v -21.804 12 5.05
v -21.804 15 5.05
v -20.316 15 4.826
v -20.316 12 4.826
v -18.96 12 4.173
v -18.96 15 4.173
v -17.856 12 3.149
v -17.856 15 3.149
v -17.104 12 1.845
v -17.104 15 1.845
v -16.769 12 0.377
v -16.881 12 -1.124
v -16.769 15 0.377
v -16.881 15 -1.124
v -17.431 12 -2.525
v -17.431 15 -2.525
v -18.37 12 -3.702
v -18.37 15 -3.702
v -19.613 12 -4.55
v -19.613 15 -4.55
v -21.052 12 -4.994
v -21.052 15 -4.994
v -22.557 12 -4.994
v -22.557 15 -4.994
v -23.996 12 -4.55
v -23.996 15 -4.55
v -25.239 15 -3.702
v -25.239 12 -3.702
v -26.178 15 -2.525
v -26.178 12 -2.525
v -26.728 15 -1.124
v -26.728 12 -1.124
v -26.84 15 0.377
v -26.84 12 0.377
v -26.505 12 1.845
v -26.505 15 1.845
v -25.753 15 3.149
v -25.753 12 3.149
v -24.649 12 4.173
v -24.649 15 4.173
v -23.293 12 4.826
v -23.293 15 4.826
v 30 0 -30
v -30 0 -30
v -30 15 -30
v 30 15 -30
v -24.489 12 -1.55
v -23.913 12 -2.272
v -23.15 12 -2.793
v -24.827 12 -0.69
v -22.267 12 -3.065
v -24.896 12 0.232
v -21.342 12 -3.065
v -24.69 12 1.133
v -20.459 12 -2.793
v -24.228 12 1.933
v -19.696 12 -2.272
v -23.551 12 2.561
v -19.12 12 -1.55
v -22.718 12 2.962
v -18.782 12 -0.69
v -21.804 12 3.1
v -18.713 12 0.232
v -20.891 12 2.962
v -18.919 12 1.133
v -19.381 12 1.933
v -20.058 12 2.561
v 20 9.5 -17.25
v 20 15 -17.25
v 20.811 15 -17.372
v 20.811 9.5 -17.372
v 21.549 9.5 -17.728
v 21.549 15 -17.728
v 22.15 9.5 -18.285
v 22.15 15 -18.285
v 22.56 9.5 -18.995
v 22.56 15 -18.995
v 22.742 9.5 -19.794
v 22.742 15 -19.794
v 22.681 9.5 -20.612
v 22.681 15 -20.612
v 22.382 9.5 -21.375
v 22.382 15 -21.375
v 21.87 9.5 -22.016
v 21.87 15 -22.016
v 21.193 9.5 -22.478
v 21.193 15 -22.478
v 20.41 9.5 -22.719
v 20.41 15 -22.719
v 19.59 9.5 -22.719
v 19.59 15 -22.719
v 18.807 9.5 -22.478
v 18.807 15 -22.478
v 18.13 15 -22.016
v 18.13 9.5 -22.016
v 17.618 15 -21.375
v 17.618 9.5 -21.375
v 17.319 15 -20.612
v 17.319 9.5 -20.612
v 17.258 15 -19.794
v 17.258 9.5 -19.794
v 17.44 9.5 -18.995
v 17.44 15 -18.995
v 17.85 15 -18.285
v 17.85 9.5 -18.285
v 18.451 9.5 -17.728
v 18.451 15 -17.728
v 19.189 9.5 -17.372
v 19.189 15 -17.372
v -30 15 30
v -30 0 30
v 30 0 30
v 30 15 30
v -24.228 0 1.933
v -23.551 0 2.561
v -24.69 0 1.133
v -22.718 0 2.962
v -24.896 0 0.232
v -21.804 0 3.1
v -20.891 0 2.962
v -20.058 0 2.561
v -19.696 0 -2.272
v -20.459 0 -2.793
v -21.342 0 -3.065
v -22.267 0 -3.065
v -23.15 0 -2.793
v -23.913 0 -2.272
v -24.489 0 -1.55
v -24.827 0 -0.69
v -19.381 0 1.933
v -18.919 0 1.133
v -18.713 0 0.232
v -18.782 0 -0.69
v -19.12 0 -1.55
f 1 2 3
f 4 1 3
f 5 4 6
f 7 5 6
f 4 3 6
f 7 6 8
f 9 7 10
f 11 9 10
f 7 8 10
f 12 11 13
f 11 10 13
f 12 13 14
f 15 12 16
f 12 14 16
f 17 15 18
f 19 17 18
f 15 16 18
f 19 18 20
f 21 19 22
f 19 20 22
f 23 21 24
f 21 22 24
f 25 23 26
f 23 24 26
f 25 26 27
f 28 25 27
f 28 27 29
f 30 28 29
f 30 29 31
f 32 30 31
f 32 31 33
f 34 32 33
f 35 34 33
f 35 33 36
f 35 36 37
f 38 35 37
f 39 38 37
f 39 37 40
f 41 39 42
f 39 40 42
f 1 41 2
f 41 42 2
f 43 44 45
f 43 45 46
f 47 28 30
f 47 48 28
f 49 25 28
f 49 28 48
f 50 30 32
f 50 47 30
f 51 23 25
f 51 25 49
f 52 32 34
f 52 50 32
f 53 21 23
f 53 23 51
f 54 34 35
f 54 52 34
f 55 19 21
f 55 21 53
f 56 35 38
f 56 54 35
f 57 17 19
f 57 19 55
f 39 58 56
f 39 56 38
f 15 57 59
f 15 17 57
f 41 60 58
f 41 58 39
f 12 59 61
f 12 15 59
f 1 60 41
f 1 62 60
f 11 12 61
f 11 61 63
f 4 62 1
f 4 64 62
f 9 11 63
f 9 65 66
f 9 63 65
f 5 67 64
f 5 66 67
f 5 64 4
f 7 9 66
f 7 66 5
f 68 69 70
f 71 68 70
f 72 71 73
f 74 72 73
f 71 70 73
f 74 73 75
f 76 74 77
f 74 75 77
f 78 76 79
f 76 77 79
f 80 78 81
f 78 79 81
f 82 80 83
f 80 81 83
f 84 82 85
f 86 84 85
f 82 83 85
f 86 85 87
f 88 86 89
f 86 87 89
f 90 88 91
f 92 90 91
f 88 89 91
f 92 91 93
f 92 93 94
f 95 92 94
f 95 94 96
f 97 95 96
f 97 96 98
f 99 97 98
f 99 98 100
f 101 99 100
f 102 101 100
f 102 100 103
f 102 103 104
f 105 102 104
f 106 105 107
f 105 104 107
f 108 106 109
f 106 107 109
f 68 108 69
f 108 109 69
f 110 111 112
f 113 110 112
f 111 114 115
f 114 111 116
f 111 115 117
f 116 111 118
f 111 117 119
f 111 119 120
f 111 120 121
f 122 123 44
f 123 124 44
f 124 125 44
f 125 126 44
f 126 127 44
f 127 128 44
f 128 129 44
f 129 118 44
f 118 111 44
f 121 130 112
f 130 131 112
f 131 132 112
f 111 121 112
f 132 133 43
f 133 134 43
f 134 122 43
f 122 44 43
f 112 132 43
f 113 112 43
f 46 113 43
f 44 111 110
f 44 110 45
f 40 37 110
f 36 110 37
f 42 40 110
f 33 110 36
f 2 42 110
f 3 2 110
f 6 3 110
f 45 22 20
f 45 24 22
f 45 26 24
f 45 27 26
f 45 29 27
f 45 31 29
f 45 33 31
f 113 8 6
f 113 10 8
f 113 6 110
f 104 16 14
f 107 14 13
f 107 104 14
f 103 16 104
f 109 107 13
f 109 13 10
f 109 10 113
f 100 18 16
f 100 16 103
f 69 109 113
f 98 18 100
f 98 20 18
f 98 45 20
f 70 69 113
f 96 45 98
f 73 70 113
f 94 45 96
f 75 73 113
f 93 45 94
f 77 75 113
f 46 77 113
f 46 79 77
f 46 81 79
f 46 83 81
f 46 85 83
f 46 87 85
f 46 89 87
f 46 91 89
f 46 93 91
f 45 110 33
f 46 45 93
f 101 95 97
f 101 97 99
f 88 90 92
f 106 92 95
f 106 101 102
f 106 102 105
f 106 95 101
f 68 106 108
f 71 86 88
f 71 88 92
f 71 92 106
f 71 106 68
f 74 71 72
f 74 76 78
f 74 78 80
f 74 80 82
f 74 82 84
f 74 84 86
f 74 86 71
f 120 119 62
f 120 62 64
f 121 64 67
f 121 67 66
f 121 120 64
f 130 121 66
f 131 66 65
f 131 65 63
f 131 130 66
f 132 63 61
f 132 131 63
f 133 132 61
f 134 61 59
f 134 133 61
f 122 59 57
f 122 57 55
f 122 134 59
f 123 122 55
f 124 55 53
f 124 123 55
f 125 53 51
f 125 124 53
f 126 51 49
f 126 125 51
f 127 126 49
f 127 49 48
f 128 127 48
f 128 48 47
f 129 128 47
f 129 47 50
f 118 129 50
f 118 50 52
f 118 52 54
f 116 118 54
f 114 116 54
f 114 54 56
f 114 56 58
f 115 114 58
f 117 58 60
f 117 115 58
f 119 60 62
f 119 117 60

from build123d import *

# Parameters (mm, degrees)
SKETCH2_W           = 60
SKETCH2_H           = 60
BOSS_EXTRUDE1_DEPTH = 15
SKETCH3_R           = 5.05
CUT_EXTRUDE3_DEPTH  = 3
SKETCH5_R           = 3.1
CUT_EXTRUDE4_DEPTH  = 12
SKETCH6_R           = 2.75
CUT_EXTRUDE5_DEPTH  = 5.5


with BuildPart() as part:
    # Sketch2 → Boss-Extrude1 (new body)
    with BuildSketch(Plane(origin=(0, 0, 0), x_dir=(1, 0, 0), z_dir=(0, 1, 0))):
        Rectangle(SKETCH2_W, SKETCH2_H)
    extrude(amount=BOSS_EXTRUDE1_DEPTH)

    # Sketch3 → Cut-Extrude3 (cut)
    with BuildSketch(Plane(origin=(0, 15, 0), x_dir=(1, 0, 0), z_dir=(0, 1, 0))):
        with Locations(Location((-21.804493365, 0, 0), (0, 0, 270))):
            Circle(SKETCH3_R)
    extrude(amount=-CUT_EXTRUDE3_DEPTH, mode=Mode.SUBTRACT)

    # Sketch5 → Cut-Extrude4 (cut)
    with BuildSketch(Plane(origin=(0, 0, 0), x_dir=(1, 0, 0), z_dir=(0, 1, 0))):
        with Locations(Location((-21.804493365, 0, 0), (0, 0, 270))):
            Circle(SKETCH5_R)
    extrude(amount=CUT_EXTRUDE4_DEPTH, mode=Mode.SUBTRACT)

    # Sketch6 → Cut-Extrude5 (cut)
    with BuildSketch(Plane(origin=(0, 15, 0), x_dir=(1, 0, 0), z_dir=(0, 1, 0))):
        with Locations(Location((20, 20, 0), (0, 0, 270))):
            Circle(SKETCH6_R)
    extrude(amount=-CUT_EXTRUDE5_DEPTH, mode=Mode.SUBTRACT)


solid = part.part
